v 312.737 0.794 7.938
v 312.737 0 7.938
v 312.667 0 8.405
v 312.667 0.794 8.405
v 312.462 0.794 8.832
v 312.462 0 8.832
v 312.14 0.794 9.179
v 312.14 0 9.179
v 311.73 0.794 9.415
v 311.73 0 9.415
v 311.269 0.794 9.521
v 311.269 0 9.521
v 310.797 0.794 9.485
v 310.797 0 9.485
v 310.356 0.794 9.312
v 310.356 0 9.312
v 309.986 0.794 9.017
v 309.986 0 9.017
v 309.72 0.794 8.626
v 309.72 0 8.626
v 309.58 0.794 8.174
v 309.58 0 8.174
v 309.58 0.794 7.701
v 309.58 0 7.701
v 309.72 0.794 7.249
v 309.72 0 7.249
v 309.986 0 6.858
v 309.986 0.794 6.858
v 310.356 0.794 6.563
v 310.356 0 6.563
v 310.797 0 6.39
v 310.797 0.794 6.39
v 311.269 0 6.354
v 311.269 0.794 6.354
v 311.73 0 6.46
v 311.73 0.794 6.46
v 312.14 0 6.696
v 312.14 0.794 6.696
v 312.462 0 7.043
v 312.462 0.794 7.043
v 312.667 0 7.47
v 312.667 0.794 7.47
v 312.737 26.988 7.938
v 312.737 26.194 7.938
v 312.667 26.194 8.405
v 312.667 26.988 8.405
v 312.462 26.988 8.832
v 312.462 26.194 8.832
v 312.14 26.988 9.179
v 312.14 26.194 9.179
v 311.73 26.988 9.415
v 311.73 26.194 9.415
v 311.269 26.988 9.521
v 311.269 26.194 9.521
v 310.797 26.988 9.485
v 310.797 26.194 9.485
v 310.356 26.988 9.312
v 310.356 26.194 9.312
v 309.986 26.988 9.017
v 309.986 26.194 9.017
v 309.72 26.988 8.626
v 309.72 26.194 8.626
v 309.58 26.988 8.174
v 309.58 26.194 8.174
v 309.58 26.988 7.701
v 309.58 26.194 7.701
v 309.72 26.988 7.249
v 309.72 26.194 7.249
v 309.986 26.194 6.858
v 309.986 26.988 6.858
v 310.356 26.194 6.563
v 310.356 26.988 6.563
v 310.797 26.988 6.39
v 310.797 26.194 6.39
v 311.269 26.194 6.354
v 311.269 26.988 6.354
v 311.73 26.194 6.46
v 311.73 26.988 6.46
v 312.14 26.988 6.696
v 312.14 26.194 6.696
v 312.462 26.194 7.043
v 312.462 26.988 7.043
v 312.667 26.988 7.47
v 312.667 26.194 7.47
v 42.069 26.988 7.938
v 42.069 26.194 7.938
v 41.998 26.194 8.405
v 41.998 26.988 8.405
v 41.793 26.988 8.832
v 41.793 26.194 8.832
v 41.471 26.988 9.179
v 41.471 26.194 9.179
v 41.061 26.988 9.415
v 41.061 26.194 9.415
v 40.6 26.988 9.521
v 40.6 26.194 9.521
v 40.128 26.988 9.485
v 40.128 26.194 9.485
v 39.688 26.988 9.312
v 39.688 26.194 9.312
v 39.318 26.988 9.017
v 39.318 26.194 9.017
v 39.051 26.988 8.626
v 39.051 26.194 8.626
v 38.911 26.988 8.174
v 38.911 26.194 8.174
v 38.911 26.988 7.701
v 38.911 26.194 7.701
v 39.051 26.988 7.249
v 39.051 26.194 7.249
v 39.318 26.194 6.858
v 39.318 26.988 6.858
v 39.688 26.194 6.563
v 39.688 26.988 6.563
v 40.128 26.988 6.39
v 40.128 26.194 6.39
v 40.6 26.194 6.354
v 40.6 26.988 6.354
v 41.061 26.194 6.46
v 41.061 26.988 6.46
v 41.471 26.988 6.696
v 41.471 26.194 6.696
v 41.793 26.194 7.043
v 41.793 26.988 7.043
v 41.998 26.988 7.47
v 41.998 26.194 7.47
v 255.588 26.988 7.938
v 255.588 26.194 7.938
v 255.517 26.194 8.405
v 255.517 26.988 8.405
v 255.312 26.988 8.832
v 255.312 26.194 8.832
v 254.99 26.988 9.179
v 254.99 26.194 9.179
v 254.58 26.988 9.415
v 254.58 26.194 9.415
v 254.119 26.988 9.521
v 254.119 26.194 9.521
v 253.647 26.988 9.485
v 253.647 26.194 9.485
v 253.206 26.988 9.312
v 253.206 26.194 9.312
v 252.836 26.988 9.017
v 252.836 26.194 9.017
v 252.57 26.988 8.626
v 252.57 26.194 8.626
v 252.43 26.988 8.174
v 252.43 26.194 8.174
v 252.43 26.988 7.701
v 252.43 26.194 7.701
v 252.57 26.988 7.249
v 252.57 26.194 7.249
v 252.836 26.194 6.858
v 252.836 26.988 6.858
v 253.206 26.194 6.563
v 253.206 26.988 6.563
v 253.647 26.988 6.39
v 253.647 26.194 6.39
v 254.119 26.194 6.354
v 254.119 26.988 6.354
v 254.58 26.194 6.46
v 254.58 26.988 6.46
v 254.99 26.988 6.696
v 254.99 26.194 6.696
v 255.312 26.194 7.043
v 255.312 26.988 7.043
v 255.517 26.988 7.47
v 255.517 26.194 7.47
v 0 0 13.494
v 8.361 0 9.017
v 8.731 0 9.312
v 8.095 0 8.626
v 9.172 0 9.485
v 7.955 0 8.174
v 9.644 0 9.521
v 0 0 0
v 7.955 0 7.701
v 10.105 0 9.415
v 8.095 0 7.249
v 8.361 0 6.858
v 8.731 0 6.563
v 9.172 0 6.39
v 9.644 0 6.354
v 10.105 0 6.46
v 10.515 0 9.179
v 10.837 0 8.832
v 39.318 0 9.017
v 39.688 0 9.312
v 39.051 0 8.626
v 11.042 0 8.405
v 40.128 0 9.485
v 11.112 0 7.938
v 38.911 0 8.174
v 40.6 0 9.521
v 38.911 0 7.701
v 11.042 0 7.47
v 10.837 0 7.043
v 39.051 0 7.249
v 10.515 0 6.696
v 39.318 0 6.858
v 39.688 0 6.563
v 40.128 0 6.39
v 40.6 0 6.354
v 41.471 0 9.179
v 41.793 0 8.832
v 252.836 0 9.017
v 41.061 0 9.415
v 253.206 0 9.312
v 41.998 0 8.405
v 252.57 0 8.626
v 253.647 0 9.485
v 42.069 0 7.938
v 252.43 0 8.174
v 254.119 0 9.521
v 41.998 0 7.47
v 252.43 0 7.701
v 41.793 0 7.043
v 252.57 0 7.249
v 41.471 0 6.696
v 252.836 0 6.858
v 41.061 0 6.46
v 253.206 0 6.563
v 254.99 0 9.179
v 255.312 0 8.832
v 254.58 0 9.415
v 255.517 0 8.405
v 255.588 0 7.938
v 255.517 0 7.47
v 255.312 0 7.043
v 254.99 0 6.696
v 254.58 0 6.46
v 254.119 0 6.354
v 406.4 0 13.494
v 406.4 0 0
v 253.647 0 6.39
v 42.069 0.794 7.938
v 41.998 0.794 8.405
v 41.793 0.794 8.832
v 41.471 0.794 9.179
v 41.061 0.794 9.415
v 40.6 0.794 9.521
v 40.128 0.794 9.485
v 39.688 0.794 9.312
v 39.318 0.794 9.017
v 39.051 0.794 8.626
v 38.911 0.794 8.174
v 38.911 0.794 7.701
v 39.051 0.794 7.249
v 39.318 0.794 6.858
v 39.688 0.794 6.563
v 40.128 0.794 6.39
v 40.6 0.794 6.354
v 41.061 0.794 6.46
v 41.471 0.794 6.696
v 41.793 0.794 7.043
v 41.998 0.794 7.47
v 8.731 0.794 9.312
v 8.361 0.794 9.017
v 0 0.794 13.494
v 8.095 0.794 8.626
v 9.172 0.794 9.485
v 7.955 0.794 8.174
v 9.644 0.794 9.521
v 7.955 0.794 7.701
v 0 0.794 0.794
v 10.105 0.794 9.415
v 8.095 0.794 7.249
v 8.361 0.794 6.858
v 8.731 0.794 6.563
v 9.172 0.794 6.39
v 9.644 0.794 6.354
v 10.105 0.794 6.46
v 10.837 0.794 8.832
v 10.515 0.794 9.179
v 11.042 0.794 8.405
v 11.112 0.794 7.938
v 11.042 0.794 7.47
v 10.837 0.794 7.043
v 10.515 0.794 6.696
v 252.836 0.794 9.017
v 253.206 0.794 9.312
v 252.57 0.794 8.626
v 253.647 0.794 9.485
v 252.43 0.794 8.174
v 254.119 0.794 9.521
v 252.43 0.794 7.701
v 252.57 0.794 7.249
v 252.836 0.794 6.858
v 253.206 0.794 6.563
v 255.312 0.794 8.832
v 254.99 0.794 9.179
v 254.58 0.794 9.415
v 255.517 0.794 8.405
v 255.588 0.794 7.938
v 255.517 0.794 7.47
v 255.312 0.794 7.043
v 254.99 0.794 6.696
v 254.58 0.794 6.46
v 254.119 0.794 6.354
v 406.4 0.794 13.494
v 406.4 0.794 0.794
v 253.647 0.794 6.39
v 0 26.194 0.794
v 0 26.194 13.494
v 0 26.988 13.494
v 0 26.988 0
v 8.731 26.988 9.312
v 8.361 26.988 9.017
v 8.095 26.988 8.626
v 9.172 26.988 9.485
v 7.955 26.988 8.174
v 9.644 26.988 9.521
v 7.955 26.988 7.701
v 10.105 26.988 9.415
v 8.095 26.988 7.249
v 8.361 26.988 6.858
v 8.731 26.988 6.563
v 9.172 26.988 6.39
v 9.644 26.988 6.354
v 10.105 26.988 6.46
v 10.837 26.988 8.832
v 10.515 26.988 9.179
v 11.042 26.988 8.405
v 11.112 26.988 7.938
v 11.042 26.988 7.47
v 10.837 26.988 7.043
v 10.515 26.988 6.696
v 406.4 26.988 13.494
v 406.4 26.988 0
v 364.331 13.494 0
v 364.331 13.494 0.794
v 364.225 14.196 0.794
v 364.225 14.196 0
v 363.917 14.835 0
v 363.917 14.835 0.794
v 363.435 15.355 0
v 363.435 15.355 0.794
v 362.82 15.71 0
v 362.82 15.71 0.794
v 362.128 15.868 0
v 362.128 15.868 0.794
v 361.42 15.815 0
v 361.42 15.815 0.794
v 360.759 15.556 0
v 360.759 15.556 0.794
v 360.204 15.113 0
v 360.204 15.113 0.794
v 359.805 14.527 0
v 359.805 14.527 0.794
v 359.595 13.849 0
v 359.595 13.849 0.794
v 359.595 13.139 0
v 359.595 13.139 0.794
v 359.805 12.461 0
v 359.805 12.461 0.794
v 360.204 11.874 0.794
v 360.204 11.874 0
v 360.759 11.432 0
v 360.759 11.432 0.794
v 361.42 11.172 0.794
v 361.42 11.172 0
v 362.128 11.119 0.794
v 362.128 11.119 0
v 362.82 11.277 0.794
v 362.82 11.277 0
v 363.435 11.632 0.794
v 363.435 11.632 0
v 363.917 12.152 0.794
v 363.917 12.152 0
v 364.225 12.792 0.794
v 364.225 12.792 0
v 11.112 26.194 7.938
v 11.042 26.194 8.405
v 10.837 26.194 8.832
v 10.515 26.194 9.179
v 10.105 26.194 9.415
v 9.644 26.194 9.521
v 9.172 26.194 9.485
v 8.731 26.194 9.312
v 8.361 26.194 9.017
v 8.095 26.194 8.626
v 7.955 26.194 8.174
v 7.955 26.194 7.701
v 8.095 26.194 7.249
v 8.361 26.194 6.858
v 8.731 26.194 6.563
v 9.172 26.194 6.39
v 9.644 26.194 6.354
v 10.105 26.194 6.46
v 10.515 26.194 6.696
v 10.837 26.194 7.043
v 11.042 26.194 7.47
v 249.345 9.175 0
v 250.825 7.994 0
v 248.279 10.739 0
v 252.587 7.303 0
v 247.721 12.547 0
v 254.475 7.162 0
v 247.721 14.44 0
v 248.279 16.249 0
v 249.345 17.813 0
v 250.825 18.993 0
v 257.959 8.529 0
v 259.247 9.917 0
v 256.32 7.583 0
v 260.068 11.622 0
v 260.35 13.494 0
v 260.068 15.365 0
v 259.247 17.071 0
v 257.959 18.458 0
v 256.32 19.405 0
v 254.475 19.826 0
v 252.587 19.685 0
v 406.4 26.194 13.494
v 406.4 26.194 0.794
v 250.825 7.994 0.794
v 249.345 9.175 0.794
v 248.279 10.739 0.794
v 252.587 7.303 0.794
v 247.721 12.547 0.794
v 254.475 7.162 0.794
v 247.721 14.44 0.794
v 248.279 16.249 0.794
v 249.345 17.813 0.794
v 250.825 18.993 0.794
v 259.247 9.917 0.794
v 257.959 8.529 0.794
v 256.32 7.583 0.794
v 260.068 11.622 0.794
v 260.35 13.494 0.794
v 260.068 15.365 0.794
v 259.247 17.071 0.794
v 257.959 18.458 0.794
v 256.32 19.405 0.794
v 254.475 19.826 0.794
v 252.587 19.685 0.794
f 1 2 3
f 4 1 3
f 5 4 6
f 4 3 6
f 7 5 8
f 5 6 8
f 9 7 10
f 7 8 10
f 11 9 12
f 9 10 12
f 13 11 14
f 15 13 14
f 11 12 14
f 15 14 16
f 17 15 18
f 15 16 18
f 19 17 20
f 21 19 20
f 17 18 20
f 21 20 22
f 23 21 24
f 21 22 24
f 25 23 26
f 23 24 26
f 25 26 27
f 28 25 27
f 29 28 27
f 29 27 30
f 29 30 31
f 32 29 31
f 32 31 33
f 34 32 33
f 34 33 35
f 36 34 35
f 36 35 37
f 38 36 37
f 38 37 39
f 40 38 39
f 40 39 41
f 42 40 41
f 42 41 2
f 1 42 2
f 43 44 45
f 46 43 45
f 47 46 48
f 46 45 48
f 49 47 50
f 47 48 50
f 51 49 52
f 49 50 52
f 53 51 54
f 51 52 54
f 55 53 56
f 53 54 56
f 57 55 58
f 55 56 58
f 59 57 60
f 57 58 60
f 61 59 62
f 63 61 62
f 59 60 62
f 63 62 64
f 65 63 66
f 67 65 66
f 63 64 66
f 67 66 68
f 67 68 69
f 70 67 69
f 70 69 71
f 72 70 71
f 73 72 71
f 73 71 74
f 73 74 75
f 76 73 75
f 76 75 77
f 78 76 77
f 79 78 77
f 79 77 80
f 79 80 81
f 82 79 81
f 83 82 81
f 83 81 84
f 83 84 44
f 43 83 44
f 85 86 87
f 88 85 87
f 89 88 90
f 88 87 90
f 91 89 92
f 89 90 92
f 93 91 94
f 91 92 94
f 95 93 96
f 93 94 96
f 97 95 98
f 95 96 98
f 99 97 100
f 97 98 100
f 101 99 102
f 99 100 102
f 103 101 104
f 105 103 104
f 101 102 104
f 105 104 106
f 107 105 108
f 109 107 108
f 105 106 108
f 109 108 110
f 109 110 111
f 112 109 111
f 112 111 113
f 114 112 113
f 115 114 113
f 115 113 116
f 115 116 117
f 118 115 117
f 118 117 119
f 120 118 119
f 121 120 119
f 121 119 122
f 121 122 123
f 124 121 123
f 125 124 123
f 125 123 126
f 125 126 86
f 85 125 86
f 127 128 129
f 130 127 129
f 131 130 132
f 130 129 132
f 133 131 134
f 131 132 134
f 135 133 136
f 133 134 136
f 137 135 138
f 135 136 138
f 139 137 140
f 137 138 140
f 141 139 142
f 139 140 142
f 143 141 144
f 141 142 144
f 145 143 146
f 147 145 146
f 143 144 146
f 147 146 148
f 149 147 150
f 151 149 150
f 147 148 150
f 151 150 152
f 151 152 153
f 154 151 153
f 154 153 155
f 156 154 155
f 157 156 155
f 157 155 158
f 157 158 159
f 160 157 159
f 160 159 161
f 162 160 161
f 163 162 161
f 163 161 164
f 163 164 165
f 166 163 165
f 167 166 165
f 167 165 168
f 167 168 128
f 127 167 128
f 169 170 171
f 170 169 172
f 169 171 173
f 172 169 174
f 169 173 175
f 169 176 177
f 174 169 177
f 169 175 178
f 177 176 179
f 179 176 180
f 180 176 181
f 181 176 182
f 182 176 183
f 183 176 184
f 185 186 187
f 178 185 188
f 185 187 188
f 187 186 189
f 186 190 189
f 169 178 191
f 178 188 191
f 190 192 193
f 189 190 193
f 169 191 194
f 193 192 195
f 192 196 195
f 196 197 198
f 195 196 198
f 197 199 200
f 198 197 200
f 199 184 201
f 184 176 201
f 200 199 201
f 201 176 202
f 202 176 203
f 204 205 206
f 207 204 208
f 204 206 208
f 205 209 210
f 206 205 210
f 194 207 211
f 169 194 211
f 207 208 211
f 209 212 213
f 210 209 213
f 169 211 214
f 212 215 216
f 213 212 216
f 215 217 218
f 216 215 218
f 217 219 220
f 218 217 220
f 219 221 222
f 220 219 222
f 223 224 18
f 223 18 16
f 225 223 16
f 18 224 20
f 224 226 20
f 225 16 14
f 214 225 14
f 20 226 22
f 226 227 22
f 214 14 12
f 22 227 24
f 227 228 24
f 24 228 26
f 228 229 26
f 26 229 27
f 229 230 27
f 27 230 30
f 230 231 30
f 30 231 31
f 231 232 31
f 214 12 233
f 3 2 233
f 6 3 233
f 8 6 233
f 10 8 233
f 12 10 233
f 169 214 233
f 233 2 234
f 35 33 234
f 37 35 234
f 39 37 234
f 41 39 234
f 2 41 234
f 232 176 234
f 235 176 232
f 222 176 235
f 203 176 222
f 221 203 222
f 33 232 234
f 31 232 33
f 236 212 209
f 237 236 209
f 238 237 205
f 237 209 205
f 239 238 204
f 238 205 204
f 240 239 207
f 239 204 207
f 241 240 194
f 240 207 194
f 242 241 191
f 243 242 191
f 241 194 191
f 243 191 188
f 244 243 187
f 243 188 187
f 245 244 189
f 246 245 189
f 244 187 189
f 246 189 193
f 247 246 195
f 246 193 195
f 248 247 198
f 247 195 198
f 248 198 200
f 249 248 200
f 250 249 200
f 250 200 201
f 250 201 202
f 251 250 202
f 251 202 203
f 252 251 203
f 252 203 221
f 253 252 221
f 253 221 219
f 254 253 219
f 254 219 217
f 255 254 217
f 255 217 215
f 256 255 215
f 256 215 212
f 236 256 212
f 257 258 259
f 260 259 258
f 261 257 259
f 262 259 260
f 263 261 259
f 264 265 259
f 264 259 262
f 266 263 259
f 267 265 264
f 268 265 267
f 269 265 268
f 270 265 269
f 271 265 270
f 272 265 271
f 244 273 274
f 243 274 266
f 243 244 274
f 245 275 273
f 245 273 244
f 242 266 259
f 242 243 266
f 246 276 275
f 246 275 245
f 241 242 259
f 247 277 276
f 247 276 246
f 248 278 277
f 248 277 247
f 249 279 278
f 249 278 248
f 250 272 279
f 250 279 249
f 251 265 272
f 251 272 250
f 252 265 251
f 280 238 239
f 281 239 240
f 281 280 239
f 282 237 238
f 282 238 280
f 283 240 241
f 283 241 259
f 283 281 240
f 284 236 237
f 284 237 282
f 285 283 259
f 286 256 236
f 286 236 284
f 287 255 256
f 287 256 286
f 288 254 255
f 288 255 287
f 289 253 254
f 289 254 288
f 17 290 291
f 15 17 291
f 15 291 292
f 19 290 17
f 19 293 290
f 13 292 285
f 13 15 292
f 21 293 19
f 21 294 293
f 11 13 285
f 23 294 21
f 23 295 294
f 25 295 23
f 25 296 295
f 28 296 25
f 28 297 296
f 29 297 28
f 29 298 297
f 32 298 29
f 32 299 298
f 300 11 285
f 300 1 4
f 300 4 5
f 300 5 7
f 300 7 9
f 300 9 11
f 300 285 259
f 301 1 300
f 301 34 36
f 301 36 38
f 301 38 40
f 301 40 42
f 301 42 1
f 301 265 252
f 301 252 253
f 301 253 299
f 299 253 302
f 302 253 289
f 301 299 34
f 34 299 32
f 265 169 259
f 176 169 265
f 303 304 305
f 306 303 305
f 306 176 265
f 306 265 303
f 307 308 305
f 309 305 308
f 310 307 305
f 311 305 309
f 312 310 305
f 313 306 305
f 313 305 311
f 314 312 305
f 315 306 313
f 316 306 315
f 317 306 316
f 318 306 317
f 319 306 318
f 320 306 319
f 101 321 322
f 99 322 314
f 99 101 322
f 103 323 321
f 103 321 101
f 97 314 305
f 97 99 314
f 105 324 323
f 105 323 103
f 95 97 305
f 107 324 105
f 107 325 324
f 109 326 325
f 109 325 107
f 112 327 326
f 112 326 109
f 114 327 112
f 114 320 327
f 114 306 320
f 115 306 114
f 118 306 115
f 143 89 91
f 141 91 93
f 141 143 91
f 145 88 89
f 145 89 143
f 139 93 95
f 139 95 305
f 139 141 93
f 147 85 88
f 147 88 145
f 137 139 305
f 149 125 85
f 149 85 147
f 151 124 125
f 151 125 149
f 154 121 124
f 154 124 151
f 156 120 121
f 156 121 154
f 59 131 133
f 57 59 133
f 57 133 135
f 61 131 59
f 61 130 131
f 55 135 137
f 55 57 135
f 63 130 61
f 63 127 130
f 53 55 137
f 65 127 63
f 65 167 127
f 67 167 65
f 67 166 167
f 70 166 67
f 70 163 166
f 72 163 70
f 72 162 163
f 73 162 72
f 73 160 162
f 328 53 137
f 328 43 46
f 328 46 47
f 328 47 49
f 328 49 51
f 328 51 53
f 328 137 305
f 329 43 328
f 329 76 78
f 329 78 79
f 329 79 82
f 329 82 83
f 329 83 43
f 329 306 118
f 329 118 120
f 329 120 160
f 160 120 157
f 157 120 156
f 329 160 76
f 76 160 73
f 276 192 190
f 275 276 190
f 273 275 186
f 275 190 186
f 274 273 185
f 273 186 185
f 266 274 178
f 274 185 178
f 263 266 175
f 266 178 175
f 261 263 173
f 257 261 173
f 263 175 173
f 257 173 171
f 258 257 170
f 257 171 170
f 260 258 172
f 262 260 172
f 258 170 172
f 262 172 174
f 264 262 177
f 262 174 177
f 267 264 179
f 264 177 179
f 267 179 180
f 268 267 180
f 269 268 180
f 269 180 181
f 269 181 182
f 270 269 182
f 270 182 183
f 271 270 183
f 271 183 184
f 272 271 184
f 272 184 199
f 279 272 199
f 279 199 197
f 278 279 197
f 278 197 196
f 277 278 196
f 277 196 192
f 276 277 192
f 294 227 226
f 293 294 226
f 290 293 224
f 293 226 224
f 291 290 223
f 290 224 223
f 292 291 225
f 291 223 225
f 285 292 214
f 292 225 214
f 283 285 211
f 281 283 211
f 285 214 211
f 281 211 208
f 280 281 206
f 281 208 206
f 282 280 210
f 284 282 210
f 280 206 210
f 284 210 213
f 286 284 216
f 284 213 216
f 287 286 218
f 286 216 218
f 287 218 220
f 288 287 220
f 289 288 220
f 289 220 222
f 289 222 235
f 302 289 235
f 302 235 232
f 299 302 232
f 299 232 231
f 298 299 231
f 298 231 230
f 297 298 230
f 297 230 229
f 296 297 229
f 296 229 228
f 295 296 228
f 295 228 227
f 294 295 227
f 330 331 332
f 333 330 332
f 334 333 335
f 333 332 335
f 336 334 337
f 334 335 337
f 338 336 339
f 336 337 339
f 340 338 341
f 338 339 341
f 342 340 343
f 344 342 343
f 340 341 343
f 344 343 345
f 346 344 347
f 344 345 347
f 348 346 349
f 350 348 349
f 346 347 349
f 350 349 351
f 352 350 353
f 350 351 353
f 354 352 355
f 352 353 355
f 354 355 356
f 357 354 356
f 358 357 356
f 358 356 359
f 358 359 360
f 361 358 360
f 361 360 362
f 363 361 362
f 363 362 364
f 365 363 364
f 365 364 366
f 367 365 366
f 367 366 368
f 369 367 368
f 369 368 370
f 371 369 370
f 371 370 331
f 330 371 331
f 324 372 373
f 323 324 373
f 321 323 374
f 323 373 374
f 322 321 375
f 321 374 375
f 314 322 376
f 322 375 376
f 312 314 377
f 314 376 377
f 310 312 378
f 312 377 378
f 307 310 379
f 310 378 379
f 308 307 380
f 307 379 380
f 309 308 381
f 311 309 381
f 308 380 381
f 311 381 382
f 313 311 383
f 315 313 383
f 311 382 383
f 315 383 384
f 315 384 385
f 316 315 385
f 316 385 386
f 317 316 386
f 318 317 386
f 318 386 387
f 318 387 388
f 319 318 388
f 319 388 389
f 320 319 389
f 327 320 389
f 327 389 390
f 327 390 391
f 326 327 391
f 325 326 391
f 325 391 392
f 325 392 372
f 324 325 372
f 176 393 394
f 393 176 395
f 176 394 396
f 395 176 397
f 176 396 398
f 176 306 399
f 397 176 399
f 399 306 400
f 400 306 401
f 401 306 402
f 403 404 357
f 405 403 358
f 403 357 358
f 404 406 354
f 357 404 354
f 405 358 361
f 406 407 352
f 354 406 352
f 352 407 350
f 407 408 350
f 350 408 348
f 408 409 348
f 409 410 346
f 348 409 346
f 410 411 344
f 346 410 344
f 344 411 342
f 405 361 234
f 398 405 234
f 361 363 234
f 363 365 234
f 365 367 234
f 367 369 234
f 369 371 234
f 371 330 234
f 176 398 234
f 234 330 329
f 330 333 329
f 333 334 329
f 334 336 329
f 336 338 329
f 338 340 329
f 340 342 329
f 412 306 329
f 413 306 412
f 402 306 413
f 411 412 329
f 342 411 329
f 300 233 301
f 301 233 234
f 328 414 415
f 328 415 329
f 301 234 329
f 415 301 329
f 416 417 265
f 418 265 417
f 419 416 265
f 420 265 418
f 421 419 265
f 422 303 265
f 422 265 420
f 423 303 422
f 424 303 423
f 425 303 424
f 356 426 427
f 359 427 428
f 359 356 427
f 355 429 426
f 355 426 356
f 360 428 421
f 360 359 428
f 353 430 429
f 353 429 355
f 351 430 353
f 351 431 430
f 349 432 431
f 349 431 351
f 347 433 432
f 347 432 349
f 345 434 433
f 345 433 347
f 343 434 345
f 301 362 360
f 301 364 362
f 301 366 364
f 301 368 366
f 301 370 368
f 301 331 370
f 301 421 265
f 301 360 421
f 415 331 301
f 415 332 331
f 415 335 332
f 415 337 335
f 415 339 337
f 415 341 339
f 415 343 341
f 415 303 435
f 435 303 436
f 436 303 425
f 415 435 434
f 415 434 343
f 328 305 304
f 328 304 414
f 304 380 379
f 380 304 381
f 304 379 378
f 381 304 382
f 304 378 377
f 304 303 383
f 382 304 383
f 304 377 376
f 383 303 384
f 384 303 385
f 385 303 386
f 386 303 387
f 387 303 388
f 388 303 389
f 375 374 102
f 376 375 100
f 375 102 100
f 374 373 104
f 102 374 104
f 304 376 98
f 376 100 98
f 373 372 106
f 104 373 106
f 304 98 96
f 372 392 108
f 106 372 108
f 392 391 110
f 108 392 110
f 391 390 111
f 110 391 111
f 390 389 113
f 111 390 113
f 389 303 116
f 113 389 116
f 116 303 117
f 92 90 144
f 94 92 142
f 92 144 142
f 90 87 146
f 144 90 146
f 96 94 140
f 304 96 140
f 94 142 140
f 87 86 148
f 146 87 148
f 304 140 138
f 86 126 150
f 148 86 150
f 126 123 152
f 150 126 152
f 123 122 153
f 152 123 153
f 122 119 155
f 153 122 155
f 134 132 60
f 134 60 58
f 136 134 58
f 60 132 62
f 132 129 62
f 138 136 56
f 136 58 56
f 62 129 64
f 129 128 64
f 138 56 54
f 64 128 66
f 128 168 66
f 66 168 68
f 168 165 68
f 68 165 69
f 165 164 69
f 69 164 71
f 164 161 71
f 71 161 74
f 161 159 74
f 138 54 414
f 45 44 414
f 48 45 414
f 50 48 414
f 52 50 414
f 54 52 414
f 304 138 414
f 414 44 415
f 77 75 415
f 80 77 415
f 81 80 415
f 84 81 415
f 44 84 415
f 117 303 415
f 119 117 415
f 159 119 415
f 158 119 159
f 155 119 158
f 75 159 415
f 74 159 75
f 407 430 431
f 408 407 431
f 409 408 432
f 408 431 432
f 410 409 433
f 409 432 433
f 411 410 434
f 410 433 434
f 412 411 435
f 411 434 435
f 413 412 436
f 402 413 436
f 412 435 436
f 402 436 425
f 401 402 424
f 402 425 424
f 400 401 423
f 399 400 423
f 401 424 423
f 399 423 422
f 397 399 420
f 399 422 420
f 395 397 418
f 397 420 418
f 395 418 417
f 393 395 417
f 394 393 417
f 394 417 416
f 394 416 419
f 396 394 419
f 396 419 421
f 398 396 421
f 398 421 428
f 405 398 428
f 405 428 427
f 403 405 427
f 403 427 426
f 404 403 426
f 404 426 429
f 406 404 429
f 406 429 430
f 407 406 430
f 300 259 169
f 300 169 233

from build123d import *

# Parameters (mm, degrees)
F0_W     = 406.4
F0_H     = 26.9875
F1_DEPTH = 0.79375
F2_W     = 406.4
F2_H     = 0.79375
F3_DEPTH = 12.7
F4_R     = 1.5875
F5_DEPTH = 26.9885
F6_R     = 6.35
F6_R_2   = 2.38125
F7_DEPTH = 25.4


with BuildPart() as f1:
    # F0 (on Top) → F1 (new body)
    with BuildSketch(Plane.XY):
        with Locations((203.2, 13.49375)):
            Rectangle(F0_W, F0_H)
    extrude(amount=F1_DEPTH)

    # F2 (on face) → F3 (join)
    with BuildSketch(Plane.XY.offset(0.79375)):
        with Locations((203.2, 26.590625)):
            Rectangle(F2_W, F2_H)
        with Locations((203.2, 0.396875)):
            Rectangle(F2_W, F2_H)
    extrude(amount=F3_DEPTH)

    # F4 (on face) → F5 (cut, through all)
    with BuildSketch(Plane.XZ):
        with Locations((311.15, 7.9375)):
            Circle(F4_R)
        with Locations((254, 7.9375)):
            Circle(F4_R)
        with Locations((40.48125, 7.9375)):
            Circle(F4_R)
        with Locations((9.525, 7.9375)):
            Circle(F4_R)
    extrude(amount=-F5_DEPTH, mode=Mode.SUBTRACT)

    # F6 (on face) → F7 (cut)
    with BuildSketch(Plane.XY.offset(0.79375)):
        with Locations((254, 13.49375)):
            Circle(F6_R)
        with Locations((361.95, 13.49375)):
            Circle(F6_R_2)
    extrude(amount=-F7_DEPTH, mode=Mode.SUBTRACT)


solid = f1.part
